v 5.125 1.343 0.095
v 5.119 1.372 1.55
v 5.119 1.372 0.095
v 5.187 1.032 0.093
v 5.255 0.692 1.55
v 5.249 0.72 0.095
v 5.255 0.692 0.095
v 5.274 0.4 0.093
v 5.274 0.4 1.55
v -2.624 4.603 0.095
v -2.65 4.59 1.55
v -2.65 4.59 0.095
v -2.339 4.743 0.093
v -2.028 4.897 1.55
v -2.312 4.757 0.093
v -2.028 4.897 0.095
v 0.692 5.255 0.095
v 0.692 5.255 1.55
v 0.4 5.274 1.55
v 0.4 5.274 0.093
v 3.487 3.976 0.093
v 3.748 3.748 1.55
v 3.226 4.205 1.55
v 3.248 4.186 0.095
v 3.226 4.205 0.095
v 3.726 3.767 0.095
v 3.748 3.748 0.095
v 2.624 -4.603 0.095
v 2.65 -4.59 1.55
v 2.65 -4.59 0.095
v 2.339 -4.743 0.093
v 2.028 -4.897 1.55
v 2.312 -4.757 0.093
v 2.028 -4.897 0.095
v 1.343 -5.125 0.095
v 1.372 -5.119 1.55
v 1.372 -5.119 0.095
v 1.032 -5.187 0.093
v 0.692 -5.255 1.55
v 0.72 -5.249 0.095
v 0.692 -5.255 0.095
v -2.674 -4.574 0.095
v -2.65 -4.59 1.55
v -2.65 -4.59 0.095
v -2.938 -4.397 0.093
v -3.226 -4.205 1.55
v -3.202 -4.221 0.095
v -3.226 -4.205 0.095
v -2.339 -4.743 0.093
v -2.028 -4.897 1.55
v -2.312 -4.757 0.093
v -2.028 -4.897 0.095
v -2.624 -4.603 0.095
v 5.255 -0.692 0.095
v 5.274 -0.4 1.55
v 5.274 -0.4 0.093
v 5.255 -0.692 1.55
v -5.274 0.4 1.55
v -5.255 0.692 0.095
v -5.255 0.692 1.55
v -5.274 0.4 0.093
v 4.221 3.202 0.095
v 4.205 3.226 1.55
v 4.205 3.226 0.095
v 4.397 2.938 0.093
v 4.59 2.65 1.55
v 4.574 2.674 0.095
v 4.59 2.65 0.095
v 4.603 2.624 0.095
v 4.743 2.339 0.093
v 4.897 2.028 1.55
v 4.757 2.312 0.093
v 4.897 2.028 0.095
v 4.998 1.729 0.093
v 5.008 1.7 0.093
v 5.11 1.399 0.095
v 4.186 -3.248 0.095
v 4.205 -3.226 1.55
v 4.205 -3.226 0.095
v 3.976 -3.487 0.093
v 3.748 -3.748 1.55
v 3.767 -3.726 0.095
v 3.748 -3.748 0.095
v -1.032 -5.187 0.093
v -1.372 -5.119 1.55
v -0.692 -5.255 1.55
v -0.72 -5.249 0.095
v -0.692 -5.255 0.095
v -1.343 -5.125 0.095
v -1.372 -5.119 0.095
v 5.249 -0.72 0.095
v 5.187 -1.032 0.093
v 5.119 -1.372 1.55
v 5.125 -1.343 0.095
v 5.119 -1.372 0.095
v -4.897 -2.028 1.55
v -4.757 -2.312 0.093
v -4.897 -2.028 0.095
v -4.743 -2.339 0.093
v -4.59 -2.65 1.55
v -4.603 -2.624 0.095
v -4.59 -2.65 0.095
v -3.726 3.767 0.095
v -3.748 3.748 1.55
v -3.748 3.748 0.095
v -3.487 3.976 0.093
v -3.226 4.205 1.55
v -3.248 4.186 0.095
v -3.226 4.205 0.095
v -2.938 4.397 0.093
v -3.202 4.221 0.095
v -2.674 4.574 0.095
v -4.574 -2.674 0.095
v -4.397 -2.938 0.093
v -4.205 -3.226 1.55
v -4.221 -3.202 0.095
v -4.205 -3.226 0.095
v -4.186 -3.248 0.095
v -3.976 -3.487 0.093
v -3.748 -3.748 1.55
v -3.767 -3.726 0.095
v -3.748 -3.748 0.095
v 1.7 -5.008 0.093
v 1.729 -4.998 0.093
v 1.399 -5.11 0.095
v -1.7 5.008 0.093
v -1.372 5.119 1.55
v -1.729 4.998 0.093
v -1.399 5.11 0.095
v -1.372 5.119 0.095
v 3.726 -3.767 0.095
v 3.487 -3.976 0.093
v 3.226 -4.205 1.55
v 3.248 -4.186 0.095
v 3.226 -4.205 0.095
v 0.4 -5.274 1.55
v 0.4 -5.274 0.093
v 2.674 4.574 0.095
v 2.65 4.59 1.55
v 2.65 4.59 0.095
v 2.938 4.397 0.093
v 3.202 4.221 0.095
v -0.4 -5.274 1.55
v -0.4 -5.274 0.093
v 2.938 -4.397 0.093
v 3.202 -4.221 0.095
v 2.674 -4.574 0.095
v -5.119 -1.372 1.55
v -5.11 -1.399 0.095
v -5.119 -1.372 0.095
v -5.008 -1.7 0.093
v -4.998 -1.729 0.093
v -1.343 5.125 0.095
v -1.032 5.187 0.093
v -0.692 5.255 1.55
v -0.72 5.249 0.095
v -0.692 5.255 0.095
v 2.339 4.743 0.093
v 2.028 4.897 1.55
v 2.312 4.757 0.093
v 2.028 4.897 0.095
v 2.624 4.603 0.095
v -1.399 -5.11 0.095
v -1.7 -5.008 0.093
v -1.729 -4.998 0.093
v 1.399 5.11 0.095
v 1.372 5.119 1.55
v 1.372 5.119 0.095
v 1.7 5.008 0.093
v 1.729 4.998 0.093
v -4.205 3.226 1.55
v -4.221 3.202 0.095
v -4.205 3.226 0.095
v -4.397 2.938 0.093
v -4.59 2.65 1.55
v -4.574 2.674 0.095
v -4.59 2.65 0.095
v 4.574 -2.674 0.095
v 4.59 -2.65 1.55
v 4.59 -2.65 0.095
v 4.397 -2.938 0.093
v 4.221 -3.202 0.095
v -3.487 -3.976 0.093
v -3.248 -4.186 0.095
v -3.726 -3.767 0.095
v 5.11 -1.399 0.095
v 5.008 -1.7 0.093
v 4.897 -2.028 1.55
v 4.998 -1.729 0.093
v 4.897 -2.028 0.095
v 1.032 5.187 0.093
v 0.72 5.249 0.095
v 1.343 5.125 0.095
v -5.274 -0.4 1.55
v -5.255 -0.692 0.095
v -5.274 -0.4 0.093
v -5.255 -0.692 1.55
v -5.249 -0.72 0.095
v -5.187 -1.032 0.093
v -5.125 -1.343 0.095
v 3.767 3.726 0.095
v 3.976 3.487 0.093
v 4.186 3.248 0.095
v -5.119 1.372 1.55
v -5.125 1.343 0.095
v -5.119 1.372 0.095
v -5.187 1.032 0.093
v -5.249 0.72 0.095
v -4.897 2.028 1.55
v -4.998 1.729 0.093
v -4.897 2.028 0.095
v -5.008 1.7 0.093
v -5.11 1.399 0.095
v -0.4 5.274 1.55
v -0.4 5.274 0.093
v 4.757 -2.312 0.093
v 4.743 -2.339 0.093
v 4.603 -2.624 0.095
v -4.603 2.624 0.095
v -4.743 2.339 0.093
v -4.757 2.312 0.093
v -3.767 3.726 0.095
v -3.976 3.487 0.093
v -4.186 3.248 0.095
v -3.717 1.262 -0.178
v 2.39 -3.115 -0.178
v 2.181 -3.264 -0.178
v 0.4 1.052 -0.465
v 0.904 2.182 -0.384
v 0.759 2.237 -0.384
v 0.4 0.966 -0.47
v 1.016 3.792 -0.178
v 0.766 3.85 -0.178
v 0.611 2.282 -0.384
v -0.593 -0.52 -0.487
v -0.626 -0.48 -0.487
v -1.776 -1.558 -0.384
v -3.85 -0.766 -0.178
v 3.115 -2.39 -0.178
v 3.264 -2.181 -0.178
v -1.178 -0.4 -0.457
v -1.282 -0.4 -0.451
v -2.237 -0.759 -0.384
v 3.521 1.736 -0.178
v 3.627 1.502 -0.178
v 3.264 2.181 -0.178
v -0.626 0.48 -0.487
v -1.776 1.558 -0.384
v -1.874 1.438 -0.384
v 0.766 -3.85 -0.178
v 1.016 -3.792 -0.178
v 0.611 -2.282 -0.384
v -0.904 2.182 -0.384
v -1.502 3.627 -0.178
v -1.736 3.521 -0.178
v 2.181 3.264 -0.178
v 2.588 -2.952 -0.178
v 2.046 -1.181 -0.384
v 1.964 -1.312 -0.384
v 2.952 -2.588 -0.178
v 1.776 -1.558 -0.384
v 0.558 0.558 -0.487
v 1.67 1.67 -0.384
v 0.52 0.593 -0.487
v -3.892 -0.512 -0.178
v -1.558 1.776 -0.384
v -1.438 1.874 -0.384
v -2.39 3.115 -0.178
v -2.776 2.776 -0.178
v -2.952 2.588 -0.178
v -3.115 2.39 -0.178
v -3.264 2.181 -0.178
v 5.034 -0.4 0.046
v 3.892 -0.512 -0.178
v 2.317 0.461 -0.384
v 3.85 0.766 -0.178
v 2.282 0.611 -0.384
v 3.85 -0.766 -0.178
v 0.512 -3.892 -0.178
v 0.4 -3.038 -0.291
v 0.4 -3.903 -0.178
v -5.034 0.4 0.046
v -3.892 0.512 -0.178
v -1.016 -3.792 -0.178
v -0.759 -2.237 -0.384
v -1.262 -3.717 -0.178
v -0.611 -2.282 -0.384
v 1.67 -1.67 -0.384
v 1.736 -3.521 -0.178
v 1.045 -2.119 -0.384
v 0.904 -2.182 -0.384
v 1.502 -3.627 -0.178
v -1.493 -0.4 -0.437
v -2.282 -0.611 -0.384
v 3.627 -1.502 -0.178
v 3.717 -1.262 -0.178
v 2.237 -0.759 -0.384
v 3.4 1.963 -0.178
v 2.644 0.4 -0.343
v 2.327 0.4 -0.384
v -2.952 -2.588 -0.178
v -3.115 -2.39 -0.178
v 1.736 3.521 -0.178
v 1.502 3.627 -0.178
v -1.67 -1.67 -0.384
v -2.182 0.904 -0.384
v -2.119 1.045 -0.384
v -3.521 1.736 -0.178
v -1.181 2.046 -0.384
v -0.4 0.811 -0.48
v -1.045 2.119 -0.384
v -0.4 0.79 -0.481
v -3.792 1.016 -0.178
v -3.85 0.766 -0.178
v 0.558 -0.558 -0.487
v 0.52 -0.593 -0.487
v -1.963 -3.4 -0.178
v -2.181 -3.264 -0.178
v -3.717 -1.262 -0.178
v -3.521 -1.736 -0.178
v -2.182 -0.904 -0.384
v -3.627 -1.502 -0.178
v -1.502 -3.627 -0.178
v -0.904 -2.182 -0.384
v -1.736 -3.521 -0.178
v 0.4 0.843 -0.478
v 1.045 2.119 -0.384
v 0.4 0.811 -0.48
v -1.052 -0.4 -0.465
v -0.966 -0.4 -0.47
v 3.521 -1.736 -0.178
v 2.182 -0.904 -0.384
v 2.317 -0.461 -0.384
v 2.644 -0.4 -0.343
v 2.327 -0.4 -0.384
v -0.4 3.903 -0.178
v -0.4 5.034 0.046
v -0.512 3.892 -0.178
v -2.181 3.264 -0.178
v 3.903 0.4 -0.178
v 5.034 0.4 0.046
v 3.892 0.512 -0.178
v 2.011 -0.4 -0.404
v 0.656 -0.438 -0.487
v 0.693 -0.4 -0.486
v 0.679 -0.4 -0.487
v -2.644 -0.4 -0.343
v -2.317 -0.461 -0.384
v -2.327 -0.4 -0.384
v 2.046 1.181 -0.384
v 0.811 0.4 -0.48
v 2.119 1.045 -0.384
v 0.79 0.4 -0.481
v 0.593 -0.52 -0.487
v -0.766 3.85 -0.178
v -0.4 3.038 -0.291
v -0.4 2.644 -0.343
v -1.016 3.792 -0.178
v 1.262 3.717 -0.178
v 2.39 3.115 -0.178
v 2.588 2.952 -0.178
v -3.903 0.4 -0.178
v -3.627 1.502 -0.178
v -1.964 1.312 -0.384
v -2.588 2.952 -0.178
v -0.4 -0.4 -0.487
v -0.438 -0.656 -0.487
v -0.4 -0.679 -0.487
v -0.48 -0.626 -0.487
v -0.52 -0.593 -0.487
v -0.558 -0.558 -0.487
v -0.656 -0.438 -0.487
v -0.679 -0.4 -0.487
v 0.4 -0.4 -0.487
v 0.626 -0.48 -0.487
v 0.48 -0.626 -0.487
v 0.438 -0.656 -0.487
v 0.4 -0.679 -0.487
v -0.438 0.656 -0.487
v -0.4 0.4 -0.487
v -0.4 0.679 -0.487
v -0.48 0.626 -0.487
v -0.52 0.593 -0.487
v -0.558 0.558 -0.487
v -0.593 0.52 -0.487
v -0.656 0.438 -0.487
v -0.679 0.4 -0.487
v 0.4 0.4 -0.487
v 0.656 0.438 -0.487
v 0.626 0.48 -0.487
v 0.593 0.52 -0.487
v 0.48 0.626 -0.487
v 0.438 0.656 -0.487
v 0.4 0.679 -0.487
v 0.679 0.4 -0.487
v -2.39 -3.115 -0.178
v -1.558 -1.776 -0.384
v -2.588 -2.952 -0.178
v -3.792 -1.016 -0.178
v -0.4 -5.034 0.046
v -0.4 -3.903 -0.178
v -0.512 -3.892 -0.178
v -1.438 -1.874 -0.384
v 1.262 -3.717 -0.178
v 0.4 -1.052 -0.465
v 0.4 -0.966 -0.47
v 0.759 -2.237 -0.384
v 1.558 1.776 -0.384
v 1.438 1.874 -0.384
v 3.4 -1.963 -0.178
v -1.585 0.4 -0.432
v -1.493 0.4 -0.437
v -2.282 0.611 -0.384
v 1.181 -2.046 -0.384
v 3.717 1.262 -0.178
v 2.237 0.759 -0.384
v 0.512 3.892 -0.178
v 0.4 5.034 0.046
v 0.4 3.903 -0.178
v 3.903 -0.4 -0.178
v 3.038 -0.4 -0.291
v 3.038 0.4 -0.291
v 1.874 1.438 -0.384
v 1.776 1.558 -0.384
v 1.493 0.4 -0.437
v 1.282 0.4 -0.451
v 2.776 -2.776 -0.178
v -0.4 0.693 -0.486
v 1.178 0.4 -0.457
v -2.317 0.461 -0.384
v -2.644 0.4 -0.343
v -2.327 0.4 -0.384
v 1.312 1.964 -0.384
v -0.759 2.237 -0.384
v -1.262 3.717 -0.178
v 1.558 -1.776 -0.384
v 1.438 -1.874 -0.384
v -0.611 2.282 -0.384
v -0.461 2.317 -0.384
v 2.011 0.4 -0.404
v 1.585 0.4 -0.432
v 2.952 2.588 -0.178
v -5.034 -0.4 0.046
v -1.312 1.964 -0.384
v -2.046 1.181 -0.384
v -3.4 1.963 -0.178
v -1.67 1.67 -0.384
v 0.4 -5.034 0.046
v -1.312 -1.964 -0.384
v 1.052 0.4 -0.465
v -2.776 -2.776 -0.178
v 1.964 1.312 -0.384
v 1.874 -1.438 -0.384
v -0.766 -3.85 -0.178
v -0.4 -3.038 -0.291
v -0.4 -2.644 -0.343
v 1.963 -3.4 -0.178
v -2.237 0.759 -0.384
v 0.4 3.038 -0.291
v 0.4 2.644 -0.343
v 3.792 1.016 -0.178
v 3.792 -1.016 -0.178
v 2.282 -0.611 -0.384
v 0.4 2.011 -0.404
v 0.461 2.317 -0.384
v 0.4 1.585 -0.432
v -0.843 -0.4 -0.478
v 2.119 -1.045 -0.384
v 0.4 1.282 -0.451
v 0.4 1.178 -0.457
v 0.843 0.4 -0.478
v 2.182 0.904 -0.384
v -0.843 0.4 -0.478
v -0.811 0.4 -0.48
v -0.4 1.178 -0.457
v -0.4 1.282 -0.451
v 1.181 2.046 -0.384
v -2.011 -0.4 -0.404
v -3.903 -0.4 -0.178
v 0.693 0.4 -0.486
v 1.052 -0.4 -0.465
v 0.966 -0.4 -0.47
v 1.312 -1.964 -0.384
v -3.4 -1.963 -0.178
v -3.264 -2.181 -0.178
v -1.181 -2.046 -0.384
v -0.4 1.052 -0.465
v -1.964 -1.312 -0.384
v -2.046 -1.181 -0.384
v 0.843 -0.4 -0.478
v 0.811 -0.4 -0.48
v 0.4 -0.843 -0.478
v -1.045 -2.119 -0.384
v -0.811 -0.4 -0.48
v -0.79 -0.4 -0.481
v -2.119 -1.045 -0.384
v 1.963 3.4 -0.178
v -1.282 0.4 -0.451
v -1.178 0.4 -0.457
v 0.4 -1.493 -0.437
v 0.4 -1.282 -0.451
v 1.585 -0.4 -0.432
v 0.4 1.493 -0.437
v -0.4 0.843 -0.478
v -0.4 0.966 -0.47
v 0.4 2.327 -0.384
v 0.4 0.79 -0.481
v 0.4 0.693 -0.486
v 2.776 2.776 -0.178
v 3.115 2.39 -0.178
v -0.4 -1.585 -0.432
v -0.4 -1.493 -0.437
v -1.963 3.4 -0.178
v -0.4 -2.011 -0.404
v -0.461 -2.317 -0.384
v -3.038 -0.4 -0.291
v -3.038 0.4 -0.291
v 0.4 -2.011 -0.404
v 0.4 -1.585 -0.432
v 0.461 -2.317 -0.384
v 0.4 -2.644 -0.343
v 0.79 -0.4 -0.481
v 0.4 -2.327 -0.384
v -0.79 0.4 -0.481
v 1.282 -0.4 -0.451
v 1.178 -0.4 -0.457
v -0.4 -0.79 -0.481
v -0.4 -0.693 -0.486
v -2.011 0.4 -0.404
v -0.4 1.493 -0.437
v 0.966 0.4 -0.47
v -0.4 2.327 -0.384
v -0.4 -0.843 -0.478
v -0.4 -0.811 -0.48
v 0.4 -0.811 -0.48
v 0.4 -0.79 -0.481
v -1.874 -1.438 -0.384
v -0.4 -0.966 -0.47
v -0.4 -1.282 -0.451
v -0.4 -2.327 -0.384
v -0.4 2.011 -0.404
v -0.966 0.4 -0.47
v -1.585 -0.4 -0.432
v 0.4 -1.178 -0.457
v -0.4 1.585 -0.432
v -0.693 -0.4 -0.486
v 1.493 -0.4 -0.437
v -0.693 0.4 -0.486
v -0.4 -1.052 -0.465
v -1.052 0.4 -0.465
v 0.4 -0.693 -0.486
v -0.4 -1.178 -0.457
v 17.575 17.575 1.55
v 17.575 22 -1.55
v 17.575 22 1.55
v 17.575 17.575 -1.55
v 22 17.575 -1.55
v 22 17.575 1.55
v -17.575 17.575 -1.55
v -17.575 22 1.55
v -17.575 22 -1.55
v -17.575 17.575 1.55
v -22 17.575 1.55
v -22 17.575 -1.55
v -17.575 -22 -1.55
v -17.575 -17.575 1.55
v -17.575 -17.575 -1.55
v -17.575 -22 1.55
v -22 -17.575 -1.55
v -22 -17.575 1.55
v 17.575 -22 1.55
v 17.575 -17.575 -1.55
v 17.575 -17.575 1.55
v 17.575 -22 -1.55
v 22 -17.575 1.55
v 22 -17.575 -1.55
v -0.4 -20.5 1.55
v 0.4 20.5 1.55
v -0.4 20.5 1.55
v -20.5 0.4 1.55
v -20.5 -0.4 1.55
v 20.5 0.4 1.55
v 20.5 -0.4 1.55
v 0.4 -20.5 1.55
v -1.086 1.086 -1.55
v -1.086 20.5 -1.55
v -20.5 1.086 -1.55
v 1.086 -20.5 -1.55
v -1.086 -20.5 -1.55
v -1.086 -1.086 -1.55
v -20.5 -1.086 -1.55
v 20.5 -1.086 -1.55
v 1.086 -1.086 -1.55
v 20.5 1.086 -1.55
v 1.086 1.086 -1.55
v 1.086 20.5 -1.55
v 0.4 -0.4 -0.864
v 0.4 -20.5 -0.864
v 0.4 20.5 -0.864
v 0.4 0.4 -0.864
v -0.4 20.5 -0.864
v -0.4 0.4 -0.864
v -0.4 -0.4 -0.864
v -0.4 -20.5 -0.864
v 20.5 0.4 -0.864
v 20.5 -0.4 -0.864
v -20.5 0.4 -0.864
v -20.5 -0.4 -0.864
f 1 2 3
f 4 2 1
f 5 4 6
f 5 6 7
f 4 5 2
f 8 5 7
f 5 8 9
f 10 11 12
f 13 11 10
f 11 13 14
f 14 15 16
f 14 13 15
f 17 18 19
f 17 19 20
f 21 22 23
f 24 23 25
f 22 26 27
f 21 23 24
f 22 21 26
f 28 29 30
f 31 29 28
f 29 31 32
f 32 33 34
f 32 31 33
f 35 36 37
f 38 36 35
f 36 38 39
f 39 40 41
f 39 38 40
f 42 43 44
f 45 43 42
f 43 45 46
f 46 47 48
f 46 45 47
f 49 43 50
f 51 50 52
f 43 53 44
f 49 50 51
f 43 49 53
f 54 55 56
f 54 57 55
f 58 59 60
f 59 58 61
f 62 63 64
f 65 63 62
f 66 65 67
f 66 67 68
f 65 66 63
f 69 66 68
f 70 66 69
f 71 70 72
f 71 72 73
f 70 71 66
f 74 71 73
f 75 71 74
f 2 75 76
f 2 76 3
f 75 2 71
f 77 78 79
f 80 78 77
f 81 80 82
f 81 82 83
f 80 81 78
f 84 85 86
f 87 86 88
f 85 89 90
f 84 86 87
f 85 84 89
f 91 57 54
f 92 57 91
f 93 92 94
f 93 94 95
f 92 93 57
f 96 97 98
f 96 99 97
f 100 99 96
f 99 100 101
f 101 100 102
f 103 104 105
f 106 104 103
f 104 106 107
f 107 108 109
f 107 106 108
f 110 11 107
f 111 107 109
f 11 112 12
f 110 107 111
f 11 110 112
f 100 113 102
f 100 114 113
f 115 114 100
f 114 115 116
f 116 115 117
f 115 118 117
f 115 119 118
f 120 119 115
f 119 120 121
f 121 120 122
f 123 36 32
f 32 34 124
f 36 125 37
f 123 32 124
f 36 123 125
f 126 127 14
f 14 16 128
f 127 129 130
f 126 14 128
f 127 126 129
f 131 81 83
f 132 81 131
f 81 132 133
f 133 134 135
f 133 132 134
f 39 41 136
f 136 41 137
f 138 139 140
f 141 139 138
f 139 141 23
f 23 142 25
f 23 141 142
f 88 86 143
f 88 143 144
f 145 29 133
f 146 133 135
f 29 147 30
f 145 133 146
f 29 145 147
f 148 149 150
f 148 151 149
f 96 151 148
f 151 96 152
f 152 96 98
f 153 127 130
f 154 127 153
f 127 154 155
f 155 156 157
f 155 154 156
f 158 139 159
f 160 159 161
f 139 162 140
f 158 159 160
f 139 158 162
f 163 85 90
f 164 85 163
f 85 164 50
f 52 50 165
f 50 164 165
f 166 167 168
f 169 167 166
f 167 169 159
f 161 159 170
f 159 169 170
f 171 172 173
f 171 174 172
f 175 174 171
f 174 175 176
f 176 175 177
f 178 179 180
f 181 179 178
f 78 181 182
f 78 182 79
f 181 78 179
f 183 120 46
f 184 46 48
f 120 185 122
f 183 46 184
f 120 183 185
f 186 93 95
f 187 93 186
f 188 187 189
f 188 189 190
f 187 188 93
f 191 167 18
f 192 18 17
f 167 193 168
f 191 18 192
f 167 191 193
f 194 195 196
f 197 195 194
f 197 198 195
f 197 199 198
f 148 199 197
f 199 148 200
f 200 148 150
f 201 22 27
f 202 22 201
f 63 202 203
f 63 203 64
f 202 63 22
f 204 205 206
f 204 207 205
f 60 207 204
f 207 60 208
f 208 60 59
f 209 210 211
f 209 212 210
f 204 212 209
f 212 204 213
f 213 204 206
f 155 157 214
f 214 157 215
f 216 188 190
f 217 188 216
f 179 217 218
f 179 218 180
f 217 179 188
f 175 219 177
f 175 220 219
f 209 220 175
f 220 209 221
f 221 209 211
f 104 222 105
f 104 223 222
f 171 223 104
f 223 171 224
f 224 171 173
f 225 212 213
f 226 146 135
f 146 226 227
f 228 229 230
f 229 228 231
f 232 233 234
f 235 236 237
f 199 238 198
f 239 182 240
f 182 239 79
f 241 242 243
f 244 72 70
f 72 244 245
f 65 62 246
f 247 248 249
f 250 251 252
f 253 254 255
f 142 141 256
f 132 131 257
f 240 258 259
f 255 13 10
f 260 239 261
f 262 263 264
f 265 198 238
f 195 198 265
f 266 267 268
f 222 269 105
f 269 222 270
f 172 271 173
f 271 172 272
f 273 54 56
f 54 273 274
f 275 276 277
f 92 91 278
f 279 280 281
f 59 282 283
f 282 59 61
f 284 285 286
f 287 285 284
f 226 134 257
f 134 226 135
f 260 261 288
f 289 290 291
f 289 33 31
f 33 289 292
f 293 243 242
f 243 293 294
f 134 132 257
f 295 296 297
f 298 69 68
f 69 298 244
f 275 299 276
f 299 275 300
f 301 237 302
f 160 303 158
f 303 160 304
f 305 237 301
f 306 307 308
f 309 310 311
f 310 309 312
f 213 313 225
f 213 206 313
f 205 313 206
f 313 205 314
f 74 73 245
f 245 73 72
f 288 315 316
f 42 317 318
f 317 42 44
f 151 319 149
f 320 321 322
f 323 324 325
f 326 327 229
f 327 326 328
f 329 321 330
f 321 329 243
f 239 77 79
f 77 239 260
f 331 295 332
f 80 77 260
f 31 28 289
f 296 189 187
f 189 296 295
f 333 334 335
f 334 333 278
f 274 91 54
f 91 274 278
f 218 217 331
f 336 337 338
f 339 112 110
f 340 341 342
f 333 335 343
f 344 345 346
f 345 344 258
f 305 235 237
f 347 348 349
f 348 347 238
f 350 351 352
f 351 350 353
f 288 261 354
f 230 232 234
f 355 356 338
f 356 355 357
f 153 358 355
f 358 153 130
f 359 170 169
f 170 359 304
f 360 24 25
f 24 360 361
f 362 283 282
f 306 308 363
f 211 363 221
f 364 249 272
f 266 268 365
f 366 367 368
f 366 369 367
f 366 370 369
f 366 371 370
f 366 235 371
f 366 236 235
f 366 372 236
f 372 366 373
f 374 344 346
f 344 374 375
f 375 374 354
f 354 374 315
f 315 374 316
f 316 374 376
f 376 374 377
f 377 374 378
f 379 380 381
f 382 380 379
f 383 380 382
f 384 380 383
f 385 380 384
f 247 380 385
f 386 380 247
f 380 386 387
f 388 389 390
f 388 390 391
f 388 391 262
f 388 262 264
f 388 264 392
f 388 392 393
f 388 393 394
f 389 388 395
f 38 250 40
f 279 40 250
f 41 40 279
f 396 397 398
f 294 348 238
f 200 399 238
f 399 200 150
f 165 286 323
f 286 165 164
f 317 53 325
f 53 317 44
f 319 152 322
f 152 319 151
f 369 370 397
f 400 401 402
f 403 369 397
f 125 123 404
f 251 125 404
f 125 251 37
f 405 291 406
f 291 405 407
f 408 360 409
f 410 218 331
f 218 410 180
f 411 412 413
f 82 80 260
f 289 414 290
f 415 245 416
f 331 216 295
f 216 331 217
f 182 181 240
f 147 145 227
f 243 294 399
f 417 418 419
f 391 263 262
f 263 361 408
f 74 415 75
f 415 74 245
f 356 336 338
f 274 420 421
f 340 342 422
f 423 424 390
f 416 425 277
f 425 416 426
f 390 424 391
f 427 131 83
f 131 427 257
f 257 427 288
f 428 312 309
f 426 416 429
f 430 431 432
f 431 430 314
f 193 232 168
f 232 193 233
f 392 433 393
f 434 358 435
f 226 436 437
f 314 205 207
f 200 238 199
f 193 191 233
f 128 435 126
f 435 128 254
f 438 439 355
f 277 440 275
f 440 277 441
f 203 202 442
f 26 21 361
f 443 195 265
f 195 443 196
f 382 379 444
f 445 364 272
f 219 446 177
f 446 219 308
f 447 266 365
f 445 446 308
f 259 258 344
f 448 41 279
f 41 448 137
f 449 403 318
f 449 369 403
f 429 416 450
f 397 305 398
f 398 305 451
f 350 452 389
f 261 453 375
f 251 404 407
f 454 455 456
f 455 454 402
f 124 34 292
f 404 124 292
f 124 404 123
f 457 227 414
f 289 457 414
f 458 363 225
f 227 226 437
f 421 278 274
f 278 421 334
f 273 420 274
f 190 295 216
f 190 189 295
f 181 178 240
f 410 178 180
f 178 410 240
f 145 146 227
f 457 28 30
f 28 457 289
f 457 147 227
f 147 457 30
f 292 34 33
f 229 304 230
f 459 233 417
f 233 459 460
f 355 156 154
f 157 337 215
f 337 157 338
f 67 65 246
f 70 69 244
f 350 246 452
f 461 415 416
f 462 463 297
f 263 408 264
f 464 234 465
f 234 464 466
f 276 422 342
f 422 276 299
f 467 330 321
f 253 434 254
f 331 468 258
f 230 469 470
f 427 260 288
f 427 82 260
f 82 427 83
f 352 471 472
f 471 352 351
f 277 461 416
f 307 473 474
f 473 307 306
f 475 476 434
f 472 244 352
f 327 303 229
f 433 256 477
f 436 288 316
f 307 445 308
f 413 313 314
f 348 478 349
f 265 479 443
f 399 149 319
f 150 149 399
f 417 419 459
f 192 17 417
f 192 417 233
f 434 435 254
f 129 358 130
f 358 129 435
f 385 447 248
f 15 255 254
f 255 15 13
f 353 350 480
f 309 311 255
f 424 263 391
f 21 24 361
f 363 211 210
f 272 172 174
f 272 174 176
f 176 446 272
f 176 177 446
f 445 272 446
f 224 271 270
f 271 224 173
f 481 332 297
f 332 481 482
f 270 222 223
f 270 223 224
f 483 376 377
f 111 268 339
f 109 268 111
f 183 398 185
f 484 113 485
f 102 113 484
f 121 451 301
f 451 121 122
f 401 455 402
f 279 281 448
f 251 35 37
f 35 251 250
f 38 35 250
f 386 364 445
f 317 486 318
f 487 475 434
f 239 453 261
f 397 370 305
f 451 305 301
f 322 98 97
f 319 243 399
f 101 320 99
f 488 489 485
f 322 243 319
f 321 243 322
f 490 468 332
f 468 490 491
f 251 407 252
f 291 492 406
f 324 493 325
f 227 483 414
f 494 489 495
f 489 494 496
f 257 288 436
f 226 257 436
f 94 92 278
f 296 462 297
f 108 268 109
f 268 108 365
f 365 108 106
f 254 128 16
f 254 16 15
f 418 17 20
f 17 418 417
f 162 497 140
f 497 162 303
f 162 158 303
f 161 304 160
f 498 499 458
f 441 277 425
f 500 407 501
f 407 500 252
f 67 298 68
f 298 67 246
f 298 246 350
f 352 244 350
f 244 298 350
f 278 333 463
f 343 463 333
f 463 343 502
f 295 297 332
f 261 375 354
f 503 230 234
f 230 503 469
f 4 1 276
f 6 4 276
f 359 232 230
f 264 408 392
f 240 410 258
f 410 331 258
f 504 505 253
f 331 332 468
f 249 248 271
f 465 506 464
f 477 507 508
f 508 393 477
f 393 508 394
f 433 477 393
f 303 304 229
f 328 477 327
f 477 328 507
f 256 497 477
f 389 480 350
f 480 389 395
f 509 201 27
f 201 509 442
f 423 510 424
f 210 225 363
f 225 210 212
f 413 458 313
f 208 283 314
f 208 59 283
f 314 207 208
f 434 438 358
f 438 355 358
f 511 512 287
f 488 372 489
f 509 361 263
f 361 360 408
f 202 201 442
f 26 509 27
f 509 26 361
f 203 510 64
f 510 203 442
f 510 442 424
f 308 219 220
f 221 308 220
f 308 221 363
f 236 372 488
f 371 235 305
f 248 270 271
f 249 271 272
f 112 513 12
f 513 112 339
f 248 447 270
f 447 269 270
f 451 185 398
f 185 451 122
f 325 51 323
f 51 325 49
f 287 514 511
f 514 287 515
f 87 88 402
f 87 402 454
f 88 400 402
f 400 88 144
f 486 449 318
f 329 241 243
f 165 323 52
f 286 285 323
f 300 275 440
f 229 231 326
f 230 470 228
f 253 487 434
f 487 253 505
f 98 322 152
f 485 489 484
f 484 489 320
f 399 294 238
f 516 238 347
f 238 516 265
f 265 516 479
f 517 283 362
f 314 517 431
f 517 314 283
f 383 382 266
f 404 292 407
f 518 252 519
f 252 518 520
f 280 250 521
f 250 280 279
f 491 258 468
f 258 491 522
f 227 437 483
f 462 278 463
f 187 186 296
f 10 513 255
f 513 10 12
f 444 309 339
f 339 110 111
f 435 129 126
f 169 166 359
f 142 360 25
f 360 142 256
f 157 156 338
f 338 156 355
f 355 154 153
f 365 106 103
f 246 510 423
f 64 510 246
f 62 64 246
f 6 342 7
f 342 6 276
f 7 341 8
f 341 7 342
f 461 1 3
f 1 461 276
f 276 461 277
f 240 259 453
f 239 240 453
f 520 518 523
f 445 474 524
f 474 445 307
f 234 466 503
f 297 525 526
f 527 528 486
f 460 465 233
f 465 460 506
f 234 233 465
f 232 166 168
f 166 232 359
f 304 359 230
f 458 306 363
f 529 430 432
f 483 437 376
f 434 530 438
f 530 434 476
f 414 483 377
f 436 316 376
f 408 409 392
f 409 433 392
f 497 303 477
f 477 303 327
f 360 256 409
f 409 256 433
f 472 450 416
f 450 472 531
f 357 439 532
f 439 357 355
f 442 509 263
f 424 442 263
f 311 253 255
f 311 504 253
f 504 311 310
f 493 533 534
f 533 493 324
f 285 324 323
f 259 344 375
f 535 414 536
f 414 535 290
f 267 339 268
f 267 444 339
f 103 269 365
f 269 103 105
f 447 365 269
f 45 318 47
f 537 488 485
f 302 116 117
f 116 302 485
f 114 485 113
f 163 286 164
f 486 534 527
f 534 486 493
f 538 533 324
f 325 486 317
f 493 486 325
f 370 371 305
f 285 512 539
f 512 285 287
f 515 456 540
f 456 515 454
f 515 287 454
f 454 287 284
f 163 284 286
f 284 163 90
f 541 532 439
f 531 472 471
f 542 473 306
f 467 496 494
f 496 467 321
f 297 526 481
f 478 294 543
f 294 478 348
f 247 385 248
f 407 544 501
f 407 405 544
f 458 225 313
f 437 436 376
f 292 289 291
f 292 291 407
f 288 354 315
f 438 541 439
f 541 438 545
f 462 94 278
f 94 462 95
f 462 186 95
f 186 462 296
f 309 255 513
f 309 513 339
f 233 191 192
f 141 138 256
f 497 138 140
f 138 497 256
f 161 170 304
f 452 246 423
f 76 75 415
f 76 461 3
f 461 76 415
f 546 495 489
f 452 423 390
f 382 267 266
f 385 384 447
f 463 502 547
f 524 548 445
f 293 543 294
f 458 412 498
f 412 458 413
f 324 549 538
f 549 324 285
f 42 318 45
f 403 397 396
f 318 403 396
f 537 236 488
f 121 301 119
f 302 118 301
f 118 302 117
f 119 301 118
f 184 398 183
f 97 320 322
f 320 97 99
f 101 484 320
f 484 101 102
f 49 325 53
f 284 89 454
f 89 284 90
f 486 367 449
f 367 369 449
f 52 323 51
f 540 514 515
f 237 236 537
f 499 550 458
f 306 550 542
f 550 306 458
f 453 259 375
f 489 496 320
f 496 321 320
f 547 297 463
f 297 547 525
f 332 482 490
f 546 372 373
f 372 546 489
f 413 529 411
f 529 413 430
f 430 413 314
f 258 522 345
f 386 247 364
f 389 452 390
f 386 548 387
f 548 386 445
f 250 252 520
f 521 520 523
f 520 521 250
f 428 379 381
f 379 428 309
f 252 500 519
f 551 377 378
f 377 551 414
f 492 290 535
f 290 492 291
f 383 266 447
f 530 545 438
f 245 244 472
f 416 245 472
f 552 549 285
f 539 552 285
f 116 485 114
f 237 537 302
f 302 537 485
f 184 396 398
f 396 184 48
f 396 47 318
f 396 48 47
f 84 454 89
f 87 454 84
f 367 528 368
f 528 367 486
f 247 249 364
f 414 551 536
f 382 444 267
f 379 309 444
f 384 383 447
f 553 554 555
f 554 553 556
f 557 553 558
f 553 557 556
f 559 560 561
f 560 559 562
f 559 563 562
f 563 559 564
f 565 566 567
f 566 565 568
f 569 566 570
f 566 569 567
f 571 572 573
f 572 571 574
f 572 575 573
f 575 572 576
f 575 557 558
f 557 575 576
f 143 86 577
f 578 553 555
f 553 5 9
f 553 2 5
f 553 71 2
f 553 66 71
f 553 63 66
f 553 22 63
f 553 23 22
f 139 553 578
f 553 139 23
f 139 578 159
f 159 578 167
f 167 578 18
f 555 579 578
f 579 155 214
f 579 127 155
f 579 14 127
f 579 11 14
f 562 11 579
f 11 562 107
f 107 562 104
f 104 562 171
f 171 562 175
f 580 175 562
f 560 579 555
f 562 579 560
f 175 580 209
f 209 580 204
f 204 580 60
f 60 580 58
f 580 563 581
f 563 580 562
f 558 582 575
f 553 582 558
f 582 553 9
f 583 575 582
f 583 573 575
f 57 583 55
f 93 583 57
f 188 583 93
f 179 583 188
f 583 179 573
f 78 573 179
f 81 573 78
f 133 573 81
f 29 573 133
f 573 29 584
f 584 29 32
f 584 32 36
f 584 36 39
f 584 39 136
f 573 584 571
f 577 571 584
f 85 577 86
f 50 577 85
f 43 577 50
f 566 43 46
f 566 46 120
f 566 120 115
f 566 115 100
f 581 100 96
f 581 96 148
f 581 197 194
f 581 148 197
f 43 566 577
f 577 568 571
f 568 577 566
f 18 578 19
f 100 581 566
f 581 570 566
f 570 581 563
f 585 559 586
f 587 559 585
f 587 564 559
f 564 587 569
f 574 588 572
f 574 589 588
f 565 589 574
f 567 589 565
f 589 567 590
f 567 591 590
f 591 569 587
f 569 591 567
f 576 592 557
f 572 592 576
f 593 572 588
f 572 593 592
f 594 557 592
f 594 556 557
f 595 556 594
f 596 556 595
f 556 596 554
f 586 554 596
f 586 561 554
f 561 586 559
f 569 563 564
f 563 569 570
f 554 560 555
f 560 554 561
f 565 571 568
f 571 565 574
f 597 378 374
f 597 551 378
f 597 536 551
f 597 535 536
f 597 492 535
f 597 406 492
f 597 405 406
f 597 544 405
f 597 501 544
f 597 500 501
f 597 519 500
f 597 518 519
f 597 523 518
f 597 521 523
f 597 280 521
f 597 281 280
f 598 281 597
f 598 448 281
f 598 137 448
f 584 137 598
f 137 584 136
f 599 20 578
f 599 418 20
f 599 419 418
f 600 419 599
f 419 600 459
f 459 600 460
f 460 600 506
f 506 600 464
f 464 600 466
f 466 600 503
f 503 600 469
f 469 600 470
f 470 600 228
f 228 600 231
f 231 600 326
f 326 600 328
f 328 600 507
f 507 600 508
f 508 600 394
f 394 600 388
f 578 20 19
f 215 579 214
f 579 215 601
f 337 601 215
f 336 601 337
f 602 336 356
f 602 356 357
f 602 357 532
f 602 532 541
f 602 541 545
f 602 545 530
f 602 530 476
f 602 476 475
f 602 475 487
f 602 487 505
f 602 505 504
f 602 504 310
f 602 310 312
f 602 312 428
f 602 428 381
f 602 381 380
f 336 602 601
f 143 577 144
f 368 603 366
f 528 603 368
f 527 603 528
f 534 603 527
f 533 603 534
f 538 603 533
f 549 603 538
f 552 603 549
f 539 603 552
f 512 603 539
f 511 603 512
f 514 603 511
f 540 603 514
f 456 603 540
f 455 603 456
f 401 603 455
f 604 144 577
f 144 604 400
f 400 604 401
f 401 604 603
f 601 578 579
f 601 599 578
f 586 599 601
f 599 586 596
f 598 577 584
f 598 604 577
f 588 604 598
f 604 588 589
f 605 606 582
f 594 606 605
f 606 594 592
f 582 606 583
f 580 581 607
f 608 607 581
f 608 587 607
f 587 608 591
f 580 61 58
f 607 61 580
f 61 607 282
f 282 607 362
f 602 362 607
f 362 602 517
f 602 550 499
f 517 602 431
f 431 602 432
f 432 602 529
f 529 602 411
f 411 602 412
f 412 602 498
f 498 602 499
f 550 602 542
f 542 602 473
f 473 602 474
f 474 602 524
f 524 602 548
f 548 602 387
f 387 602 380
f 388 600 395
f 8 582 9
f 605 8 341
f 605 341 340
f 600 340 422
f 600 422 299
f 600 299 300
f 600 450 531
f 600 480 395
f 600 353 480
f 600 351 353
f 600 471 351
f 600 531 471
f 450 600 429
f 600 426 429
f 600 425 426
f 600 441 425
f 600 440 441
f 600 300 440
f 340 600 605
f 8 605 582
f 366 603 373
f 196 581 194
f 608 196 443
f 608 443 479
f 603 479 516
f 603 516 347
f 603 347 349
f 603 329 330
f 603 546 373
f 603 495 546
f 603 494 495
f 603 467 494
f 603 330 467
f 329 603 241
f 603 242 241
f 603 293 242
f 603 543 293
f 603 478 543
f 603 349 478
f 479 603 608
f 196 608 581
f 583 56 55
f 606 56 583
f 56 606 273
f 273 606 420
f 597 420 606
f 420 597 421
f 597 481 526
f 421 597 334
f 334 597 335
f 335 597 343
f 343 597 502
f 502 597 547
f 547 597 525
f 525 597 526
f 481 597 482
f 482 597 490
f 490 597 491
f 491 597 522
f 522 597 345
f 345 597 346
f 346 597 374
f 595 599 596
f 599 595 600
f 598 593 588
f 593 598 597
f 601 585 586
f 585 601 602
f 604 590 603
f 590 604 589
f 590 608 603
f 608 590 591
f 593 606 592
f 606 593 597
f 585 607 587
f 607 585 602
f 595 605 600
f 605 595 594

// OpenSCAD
//Pill diameter
pd=9.6;//

//Pill hight1 
pt=4.2;//

//Pill hight2
pt2=2.6;//

//Parts sellect
part="top";//[pill,top,bottom]  

pc=(pt-pt2)/2;//Convex value
sp=pd/(tan(2*atan(2*pc/pd))*2)+pd;// convex diameter

//Base hight
bh=pt/2+1;

//echo(sp);// convex diameter

module pill()
{
rotate([0,0,0])intersection(){
cylinder(h=10,r=pd/2+0.5,center=true,$fn=48);
translate([0,0,-sp+(pt2-0.5)])sphere(r=sp+0.5,center=true,$fn=96);
translate([0,0,sp-(pt2-0.5)])sphere(r=sp+0.5,center=true,$fn=96);
								}
}

module post()
{
translate([21,21,bh/2])cube(size=[5,5,bh*2], center=true);
translate([-21,21,bh/2])cube(size=[5,5,bh*2], center=true);
translate([-21,-21,bh/2])cube(size=[5,5,bh*2], center=true);
translate([21,-21,bh/2])cube(size=[5,5,bh*2], center=true);
}

union(){
if(part=="pill") {
		translate([0,0,0])pill();
				 }
		else if (part=="bottom"){
union(){
difference(){
cube(size=[46,46,bh], center=true);
translate([0,0,pt/2])pill();
translate([-0.4,-20.5,-1])cube(size=[0.8,41,20], center=false);
translate([-20.5,-0.4,-1])cube(size=[41,0.8,20], center=false);
			}
post();
		}
					}
				else if (part=="top"){
translate([0,0,0]){
difference(){
		cube(size=[44,44,bh], center=true);
		translate([0,0,pt/2])pill();
		translate([-0.4,-20.5,-10])cube(size=[0.8,41,20], center=false);
		translate([-20.5,-0.4,-10])cube(size=[41,0.8,20], center=false);
		translate([0,0,-4])rotate([0,45,0])cube(size=[5,41,5], center=true);
		translate([0,0,-4])rotate([45,0,0])cube(size=[41,5,5], center=true);
		translate([0,0,-pt])scale([0.95,0.95,2])post();

			}
		}
					}
					}
